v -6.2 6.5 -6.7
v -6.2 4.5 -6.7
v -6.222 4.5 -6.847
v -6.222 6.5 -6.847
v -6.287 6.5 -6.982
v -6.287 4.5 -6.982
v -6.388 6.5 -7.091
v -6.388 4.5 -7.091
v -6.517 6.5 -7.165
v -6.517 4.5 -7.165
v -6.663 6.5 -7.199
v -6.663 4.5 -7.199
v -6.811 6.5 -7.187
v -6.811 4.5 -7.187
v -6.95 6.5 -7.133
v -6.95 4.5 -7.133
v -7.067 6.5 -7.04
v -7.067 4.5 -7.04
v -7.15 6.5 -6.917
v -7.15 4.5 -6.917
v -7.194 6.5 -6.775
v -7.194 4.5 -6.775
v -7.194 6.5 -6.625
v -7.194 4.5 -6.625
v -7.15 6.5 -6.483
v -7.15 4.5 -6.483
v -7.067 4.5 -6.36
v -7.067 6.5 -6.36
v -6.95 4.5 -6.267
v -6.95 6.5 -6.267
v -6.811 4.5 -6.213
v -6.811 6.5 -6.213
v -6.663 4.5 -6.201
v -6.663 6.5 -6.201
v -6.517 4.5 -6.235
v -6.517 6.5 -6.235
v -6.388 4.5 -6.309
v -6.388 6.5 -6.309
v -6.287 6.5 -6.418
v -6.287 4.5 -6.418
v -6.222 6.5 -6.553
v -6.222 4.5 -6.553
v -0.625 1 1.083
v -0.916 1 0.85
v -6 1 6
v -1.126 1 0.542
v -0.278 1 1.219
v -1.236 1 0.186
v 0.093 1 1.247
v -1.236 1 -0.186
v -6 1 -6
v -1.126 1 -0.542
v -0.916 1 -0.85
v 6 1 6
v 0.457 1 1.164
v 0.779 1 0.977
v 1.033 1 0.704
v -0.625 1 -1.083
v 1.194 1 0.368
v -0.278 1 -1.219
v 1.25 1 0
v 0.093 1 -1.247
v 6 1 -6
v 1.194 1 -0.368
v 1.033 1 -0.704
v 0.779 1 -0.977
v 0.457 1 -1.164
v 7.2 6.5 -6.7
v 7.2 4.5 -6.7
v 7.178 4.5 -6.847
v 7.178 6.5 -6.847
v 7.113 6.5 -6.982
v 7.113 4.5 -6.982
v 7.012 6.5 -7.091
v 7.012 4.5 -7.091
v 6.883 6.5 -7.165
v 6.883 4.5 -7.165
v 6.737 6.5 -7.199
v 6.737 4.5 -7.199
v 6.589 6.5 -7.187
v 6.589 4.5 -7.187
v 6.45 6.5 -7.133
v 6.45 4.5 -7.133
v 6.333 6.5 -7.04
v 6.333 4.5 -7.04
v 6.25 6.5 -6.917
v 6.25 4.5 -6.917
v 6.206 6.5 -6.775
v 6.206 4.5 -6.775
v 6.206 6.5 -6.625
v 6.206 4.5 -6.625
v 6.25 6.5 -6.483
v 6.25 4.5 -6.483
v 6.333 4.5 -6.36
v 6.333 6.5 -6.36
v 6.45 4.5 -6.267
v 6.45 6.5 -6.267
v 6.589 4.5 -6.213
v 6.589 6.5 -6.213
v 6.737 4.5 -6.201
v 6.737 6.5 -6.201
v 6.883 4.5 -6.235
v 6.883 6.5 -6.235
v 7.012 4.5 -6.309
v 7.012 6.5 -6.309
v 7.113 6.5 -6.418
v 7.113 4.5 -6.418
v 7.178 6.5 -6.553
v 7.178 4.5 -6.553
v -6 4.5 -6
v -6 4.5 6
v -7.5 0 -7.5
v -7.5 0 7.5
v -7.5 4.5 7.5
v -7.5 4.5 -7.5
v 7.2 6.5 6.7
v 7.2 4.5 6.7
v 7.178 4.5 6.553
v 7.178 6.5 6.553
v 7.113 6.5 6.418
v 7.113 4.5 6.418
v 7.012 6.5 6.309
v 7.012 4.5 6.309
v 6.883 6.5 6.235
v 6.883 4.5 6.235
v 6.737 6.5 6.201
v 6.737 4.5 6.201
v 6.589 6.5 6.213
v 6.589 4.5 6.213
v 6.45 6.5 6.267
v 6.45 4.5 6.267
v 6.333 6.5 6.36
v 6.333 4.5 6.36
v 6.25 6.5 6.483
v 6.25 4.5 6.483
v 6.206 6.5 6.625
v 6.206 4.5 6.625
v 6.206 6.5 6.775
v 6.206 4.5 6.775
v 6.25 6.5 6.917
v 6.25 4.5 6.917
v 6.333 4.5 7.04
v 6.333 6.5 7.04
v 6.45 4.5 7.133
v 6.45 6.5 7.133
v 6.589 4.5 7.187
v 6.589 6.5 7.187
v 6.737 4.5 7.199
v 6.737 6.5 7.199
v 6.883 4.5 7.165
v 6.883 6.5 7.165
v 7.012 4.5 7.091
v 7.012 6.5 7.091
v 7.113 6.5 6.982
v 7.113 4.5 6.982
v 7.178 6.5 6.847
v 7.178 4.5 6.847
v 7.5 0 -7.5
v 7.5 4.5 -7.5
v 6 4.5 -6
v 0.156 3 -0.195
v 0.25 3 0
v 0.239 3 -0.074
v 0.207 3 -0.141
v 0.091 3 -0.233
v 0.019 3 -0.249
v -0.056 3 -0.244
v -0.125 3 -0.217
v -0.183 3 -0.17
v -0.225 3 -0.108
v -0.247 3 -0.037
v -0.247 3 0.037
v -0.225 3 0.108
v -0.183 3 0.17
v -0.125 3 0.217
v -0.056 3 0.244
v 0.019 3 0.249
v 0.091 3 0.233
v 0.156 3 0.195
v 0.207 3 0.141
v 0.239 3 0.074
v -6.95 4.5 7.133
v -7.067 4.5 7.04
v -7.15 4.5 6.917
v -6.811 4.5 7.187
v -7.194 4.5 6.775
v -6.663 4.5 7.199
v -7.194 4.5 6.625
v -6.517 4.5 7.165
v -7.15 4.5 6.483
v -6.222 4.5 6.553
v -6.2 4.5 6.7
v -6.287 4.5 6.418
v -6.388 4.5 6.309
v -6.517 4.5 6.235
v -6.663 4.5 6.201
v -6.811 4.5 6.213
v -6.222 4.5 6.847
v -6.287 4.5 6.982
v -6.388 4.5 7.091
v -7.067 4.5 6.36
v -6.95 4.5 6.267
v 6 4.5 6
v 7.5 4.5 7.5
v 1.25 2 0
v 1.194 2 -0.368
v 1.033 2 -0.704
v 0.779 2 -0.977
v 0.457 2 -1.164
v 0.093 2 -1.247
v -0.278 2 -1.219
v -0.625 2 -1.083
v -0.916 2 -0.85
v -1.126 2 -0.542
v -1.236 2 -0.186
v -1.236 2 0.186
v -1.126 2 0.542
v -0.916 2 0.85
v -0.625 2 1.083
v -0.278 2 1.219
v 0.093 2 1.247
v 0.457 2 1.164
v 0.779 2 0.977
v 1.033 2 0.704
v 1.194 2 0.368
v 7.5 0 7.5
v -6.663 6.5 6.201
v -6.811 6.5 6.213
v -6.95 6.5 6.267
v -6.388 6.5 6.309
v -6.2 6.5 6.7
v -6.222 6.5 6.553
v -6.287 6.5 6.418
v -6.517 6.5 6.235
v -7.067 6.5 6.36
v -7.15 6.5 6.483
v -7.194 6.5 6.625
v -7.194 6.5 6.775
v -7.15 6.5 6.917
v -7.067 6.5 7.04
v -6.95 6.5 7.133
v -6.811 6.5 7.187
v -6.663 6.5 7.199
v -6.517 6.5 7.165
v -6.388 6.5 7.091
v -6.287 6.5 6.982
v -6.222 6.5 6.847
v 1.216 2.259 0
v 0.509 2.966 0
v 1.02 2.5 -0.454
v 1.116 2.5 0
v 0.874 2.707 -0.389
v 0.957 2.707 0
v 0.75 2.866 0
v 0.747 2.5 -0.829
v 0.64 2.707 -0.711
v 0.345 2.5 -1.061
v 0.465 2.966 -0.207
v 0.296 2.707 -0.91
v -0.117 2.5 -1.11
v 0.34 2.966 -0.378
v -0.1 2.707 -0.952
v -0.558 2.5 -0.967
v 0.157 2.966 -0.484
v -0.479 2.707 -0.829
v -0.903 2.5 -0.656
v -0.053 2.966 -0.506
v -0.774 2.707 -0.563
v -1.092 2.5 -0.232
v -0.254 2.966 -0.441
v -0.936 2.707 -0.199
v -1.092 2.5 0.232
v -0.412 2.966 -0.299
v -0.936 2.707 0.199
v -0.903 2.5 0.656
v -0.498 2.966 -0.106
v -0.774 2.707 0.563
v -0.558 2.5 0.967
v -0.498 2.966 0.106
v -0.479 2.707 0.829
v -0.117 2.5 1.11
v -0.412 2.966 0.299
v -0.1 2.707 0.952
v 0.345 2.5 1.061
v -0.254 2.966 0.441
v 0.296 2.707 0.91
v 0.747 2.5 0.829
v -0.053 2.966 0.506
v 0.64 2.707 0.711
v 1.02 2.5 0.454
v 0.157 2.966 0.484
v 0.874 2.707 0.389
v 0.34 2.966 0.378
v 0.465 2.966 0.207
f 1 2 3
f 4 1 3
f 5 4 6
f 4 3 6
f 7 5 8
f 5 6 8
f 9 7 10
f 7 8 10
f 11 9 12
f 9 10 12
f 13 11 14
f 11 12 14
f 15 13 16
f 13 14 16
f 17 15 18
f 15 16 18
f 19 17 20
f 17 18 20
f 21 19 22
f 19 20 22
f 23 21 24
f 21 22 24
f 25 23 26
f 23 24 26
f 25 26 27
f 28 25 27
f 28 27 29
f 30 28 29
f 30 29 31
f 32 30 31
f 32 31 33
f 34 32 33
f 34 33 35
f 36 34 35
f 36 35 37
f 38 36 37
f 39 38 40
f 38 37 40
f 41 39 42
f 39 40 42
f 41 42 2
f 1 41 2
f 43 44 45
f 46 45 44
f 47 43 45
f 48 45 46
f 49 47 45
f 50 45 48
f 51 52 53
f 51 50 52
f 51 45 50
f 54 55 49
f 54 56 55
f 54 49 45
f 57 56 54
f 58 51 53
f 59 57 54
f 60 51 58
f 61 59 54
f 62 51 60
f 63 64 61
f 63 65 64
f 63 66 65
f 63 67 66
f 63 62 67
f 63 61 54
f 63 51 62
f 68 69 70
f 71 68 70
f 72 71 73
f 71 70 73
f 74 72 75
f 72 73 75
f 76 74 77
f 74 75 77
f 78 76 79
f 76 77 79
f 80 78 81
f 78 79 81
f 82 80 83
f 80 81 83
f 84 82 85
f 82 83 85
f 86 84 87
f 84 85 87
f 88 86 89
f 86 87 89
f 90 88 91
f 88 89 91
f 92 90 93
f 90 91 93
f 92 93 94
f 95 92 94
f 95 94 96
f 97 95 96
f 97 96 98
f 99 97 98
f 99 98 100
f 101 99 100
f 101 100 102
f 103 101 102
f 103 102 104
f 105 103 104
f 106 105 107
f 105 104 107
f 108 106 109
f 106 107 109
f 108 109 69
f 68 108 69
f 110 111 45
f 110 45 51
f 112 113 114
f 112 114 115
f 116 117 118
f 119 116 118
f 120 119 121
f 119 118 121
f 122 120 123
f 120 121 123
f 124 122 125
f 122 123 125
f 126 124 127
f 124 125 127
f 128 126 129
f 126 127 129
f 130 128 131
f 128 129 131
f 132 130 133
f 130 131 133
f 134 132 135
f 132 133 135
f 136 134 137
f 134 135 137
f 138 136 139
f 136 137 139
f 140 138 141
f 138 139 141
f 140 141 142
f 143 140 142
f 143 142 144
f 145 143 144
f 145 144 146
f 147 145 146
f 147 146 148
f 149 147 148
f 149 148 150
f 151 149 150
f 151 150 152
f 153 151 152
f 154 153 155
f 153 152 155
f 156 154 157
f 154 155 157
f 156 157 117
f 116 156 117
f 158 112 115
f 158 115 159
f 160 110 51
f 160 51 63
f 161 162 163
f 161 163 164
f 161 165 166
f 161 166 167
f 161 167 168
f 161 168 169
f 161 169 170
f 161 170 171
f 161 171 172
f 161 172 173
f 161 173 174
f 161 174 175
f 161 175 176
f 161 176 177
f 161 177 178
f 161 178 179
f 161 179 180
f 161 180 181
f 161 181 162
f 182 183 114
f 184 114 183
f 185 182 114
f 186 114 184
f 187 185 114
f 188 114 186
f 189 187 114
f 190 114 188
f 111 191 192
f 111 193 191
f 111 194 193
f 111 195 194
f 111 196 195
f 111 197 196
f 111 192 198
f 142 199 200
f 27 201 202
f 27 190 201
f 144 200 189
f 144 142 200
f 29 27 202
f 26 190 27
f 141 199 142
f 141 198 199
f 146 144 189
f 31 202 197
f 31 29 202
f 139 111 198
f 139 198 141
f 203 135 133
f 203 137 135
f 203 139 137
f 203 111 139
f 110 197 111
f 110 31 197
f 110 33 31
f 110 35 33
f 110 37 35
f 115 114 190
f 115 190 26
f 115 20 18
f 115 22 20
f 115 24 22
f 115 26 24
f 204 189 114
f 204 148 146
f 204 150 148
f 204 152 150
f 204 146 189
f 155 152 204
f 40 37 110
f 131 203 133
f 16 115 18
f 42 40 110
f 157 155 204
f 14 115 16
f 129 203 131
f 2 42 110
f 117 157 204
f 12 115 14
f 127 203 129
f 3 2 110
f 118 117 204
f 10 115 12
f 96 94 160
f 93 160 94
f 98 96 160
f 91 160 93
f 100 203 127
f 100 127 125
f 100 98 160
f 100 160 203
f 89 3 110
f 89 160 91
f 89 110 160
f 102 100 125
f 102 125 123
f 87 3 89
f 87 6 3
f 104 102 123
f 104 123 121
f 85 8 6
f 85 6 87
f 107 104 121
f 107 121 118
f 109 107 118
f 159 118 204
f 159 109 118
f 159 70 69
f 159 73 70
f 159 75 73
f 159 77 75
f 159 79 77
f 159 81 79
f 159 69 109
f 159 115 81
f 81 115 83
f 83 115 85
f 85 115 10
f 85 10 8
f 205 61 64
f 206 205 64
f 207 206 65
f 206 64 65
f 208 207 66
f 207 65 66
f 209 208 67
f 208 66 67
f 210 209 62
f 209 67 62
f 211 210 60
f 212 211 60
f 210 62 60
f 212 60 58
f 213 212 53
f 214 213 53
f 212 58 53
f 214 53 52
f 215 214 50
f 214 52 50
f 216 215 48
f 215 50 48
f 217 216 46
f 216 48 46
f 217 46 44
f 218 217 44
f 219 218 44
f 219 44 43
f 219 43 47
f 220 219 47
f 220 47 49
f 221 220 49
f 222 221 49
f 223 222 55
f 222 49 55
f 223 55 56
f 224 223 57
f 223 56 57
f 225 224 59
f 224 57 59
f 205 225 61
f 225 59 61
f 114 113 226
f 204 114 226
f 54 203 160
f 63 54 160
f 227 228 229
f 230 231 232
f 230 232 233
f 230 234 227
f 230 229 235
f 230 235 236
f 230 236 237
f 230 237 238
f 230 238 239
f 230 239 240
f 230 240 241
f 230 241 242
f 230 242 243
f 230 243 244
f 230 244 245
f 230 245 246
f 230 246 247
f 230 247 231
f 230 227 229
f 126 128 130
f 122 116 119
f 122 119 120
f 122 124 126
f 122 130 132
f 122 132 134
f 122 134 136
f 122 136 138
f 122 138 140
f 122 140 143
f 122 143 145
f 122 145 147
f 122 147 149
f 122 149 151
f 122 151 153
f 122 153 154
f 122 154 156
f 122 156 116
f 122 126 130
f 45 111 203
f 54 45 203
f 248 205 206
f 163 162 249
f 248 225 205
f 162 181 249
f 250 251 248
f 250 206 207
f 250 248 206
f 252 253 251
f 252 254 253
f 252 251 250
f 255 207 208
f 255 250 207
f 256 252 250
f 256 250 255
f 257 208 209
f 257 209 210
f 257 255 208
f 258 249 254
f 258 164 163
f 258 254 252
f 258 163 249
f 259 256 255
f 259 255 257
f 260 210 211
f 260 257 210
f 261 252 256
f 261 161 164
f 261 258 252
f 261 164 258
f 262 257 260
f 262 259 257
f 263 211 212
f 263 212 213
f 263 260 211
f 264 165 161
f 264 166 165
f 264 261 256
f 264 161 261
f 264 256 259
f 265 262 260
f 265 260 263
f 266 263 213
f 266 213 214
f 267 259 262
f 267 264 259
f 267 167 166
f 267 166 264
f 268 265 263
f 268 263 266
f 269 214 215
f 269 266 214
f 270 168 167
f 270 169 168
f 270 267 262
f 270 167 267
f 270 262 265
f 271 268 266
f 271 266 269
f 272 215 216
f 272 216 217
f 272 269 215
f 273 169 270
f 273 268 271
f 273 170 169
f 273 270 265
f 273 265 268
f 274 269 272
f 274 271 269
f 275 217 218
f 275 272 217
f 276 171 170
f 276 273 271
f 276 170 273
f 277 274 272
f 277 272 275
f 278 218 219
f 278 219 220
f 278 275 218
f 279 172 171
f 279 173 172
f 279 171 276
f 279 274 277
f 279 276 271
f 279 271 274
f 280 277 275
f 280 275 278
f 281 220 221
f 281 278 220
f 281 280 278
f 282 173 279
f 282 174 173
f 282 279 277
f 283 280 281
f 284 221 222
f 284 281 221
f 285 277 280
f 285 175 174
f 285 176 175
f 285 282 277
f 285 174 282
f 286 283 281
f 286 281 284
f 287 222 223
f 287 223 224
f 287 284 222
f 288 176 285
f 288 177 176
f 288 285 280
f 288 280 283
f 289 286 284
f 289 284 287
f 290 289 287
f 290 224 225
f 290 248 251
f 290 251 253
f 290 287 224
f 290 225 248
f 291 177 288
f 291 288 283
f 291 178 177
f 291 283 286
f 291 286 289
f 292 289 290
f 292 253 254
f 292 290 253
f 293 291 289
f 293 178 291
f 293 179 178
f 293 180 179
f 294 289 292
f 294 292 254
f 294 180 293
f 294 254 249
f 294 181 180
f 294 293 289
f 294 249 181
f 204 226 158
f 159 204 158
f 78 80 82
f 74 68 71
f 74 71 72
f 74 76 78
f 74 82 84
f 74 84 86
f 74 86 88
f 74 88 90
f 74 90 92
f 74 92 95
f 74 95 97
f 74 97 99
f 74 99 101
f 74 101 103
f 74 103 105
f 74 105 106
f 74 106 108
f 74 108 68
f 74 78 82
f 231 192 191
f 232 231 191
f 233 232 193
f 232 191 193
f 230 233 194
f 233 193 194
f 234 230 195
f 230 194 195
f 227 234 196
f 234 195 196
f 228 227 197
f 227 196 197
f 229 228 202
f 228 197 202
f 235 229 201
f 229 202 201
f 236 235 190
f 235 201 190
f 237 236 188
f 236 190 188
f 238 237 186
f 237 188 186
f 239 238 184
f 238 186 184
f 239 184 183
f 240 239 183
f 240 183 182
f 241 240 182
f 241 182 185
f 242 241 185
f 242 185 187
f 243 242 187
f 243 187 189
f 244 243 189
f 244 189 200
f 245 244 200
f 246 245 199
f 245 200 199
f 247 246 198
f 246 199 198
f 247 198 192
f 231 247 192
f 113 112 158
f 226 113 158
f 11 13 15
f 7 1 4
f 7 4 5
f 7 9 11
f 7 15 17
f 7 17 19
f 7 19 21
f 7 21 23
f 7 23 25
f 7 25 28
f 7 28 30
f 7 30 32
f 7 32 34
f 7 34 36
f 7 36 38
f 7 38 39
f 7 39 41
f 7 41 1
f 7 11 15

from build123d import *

# Parameters (mm, degrees)
SKETCH1_W           = 15
SKETCH1_H           = 15
BOSS_EXTRUDE1_DEPTH = 4.5
SKETCH2_W           = 12
SKETCH2_H           = 12
CUT_EXTRUDE1_DEPTH  = 3.5
SKETCH3_R           = 1.25
BOSS_EXTRUDE2_DEPTH = 2
FILLET1_R           = 1
SKETCH4_R           = 0.5
BOSS_EXTRUDE3_DEPTH = 2


with BuildPart() as part:
    # Sketch1 → Boss-Extrude1 (new body)
    with BuildSketch(Plane(origin=(0, 0, 0), x_dir=(1, 0, 0), z_dir=(0, 1, 0))):
        Rectangle(SKETCH1_W, SKETCH1_H)
    extrude(amount=BOSS_EXTRUDE1_DEPTH)

    # Sketch2 → Cut-Extrude1 (cut)
    with BuildSketch(Plane(origin=(0, 4.5, 0), x_dir=(1, 0, 0), z_dir=(0, 1, 0))):
        Rectangle(SKETCH2_W, SKETCH2_H)
    extrude(amount=-CUT_EXTRUDE1_DEPTH, mode=Mode.SUBTRACT)

    # Sketch3 → Boss-Extrude2 (add)
    with BuildSketch(Plane(origin=(0, 1, 0), x_dir=(1, 0, 0), z_dir=(0, 1, 0))):
        Circle(SKETCH3_R)
    extrude(amount=BOSS_EXTRUDE2_DEPTH)

    # Fillet1
    fillet1_edges = [part.edges().sort_by_distance(p)[0] for p in [
        (-1.25, 3, 0),
    ]]
    fillet(fillet1_edges, radius=FILLET1_R)

    # Sketch4 → Boss-Extrude3 (add)
    with BuildSketch(Plane(origin=(0, 4.5, 0), x_dir=(1, 0, 0), z_dir=(0, 1, 0))):
        with Locations((-6.7, 6.7)):
            Circle(SKETCH4_R)
        with Locations((6.7, 6.7)):
            Circle(SKETCH4_R)
        with Locations((6.7, -6.7)):
            Circle(SKETCH4_R)
        with Locations((-6.7, -6.7)):
            Circle(SKETCH4_R)
    extrude(amount=BOSS_EXTRUDE3_DEPTH)


solid = part.part
